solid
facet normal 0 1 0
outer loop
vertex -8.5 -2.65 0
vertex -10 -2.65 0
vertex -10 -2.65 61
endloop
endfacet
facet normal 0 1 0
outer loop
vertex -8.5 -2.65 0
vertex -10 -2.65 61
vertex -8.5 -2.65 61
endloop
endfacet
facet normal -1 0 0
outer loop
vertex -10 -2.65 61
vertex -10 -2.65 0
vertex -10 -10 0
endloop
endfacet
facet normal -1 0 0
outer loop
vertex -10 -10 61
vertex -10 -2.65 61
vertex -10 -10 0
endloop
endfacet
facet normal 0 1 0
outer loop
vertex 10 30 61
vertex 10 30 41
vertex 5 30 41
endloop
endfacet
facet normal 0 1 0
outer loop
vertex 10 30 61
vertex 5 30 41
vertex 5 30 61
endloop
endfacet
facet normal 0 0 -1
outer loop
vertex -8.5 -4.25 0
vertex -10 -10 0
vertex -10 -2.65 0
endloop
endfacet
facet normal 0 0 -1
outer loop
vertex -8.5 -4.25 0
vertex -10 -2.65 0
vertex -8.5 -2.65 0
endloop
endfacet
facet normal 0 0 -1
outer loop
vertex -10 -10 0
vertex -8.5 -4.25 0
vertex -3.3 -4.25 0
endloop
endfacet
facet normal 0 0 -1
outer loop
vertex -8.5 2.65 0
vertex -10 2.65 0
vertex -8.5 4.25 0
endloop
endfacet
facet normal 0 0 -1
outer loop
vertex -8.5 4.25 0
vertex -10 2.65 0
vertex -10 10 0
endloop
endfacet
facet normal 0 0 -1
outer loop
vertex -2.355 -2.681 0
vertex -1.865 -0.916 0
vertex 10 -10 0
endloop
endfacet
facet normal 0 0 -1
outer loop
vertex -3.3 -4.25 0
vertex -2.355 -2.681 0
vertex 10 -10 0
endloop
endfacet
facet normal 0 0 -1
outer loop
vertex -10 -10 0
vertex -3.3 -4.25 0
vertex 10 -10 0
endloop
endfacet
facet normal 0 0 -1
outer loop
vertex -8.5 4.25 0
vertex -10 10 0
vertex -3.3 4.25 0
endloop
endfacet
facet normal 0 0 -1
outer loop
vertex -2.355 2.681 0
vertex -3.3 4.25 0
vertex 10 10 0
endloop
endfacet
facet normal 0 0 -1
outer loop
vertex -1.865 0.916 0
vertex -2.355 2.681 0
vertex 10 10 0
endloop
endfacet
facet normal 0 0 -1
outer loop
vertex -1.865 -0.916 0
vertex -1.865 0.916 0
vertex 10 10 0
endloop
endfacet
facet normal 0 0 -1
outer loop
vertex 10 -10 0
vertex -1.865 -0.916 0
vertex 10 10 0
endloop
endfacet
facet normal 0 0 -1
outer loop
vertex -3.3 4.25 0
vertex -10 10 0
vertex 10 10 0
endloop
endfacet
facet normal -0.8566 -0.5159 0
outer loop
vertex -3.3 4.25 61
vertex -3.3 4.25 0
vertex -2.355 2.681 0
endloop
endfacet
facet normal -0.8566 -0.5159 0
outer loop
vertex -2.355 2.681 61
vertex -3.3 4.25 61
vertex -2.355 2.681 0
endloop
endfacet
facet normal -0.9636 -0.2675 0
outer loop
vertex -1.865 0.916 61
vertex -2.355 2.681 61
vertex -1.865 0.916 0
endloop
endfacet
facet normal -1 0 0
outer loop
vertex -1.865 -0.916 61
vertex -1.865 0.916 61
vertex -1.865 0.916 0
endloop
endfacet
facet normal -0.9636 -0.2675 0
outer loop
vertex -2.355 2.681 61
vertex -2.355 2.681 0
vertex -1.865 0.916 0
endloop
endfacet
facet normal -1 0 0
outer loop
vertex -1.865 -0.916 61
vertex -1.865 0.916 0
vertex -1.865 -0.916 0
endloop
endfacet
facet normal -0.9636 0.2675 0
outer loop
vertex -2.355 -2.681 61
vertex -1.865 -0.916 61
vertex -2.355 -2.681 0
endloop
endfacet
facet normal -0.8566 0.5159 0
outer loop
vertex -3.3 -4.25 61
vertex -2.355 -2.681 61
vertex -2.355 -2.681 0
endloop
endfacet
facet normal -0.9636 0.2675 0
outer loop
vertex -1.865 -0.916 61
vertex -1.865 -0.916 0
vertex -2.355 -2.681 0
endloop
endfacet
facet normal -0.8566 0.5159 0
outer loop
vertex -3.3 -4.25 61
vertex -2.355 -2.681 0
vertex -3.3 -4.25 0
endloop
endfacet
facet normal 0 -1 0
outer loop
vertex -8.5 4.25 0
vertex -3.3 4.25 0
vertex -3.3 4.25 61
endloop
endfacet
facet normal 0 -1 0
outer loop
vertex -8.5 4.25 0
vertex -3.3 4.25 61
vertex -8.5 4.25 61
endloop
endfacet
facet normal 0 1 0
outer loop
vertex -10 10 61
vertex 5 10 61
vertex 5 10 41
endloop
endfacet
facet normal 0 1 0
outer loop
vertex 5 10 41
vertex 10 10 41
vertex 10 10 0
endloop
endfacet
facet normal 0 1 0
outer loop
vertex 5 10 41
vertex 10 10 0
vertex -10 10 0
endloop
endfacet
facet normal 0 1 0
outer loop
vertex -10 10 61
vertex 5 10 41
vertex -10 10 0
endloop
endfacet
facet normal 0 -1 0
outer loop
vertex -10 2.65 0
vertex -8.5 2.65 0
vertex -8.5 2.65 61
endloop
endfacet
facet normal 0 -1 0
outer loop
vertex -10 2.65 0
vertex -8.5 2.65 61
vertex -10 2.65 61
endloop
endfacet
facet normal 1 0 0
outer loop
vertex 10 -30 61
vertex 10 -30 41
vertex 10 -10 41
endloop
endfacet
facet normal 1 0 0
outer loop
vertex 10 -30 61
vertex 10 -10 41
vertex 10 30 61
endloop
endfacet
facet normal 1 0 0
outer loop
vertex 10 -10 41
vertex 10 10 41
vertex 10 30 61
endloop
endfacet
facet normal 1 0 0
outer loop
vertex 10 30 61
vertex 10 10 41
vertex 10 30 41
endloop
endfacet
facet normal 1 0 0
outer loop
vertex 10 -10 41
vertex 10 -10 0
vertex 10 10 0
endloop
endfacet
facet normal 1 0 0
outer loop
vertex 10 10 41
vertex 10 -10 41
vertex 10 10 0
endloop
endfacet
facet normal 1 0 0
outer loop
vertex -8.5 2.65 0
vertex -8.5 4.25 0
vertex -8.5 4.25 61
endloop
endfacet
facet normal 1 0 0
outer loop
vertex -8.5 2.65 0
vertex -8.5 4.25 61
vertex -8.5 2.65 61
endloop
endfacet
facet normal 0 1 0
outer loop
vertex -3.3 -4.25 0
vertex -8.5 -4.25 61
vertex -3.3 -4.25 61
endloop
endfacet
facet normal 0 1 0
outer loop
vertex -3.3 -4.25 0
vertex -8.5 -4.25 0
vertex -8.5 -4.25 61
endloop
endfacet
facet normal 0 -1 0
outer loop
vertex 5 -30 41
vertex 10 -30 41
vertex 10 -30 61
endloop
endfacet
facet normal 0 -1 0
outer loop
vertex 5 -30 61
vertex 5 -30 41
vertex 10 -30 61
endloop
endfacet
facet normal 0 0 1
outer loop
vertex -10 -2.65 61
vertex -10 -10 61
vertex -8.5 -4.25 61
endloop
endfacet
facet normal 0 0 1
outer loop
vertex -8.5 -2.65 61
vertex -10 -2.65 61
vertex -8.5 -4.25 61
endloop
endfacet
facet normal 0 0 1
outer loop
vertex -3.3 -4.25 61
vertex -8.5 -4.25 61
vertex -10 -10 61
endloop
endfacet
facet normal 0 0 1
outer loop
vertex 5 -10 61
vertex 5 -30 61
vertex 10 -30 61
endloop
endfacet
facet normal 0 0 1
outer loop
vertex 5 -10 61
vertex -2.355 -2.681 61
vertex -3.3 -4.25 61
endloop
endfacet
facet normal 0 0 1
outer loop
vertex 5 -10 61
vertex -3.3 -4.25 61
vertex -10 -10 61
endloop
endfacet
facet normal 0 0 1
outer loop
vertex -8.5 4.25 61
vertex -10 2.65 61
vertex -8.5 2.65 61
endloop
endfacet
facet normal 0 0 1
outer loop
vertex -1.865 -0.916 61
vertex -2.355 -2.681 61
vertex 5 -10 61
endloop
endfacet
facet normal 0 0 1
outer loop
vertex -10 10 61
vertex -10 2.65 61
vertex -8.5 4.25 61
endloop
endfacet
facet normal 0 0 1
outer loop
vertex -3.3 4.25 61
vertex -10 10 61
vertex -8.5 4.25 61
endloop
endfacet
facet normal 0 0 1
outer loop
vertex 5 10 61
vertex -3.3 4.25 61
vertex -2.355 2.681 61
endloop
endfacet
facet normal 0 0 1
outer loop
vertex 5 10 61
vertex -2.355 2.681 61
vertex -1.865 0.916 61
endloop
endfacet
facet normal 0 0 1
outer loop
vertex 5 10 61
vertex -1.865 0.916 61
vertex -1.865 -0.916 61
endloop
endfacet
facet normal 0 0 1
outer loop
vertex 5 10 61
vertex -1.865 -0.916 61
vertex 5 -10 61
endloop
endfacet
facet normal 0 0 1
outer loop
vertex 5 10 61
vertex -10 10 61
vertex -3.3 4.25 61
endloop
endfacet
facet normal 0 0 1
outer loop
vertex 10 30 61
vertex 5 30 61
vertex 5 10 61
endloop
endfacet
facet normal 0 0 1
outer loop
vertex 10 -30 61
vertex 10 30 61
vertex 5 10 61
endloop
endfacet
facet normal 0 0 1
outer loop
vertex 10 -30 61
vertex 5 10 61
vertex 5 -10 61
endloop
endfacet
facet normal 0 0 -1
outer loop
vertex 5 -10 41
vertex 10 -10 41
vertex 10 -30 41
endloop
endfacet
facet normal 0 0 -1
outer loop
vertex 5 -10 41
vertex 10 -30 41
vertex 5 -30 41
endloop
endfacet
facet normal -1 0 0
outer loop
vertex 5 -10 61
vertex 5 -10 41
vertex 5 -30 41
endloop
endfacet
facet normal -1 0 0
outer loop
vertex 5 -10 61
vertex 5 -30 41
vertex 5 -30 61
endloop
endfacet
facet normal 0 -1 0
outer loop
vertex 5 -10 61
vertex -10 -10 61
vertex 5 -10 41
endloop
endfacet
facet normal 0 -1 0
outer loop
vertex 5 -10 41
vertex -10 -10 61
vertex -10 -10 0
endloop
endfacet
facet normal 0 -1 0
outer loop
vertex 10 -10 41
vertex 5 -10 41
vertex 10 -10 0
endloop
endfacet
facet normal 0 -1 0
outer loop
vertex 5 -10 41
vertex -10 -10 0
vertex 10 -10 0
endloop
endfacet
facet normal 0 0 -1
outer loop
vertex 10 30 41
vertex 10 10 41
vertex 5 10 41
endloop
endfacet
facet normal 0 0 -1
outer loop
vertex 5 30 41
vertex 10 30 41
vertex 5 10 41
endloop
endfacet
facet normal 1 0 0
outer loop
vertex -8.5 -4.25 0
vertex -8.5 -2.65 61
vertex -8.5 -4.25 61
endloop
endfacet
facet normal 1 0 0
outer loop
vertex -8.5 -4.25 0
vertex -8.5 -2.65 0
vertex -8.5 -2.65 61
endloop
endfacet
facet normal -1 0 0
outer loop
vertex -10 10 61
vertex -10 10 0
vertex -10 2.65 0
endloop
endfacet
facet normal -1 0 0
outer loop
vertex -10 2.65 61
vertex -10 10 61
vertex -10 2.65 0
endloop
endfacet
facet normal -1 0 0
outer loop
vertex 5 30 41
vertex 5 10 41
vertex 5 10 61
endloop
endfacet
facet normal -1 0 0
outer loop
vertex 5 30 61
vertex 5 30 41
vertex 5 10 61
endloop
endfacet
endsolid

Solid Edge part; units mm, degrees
sketch "Sketch1" plane through (0, 0, 0) normal (0, 0, 1) x (1, 0, 0)
  line L0 (-10, -10) -> (10, -10)
  line L1 (10, -10) -> (10, 10)
  line L2 (10, 10) -> (-10, 10)
  line L3 (-10, 10) -> (-10, 2.65)
  line L4 (-8.5, 2.65) -> (-10, 2.65)
  line L5 (-8.5, 4.25) -> (-8.5, 2.65)
  line L6 (-3.3, 4.25) -> (-8.5, 4.25)
  arc A0 (-3.3, 4.25) -> (-3.3, -4.25) centre (-8.5833, 0) cw
  line L7 (-8.5, -4.25) -> (-3.3, -4.25)
  line L8 (-8.5, -2.65) -> (-8.5, -4.25)
  line L9 (-10, -2.65) -> (-8.5, -2.65)
  line L10 (-10, -2.65) -> (-10, -10)
extrude "Protrusion1" add sketch "Sketch1" along normal blind 61
sketch "Sketch2" plane through (0, 10, 30.5) normal (0, 1, 0) x (-1, 0, 0)
  line L0 (-10, 30.5) -> (-10, 10.5)
  line L1 (-10, 10.5) -> (-5, 10.5)
  line L2 (-5, 10.5) -> (-5, 30.5)
  line L3 (-5, 30.5) -> (-10, 30.5)
extrude "Protrusion2" add sketch "Sketch2" along normal blind 20
sketch "Sketch3" plane through (0, 10, 30.5) normal (0, 1, 0) x (-1, 0, 0)
  line L0 (-5, 10.5) -> (-5, 30.5)
  line L1 (-5, 30.5) -> (-10, 30.5)
  line L2 (-10, 30.5) -> (-10, 10.5)
  line L3 (-10, 10.5) -> (-5, 10.5)
extrude "Protrusion3" add sketch "Sketch3" against normal blind 40
